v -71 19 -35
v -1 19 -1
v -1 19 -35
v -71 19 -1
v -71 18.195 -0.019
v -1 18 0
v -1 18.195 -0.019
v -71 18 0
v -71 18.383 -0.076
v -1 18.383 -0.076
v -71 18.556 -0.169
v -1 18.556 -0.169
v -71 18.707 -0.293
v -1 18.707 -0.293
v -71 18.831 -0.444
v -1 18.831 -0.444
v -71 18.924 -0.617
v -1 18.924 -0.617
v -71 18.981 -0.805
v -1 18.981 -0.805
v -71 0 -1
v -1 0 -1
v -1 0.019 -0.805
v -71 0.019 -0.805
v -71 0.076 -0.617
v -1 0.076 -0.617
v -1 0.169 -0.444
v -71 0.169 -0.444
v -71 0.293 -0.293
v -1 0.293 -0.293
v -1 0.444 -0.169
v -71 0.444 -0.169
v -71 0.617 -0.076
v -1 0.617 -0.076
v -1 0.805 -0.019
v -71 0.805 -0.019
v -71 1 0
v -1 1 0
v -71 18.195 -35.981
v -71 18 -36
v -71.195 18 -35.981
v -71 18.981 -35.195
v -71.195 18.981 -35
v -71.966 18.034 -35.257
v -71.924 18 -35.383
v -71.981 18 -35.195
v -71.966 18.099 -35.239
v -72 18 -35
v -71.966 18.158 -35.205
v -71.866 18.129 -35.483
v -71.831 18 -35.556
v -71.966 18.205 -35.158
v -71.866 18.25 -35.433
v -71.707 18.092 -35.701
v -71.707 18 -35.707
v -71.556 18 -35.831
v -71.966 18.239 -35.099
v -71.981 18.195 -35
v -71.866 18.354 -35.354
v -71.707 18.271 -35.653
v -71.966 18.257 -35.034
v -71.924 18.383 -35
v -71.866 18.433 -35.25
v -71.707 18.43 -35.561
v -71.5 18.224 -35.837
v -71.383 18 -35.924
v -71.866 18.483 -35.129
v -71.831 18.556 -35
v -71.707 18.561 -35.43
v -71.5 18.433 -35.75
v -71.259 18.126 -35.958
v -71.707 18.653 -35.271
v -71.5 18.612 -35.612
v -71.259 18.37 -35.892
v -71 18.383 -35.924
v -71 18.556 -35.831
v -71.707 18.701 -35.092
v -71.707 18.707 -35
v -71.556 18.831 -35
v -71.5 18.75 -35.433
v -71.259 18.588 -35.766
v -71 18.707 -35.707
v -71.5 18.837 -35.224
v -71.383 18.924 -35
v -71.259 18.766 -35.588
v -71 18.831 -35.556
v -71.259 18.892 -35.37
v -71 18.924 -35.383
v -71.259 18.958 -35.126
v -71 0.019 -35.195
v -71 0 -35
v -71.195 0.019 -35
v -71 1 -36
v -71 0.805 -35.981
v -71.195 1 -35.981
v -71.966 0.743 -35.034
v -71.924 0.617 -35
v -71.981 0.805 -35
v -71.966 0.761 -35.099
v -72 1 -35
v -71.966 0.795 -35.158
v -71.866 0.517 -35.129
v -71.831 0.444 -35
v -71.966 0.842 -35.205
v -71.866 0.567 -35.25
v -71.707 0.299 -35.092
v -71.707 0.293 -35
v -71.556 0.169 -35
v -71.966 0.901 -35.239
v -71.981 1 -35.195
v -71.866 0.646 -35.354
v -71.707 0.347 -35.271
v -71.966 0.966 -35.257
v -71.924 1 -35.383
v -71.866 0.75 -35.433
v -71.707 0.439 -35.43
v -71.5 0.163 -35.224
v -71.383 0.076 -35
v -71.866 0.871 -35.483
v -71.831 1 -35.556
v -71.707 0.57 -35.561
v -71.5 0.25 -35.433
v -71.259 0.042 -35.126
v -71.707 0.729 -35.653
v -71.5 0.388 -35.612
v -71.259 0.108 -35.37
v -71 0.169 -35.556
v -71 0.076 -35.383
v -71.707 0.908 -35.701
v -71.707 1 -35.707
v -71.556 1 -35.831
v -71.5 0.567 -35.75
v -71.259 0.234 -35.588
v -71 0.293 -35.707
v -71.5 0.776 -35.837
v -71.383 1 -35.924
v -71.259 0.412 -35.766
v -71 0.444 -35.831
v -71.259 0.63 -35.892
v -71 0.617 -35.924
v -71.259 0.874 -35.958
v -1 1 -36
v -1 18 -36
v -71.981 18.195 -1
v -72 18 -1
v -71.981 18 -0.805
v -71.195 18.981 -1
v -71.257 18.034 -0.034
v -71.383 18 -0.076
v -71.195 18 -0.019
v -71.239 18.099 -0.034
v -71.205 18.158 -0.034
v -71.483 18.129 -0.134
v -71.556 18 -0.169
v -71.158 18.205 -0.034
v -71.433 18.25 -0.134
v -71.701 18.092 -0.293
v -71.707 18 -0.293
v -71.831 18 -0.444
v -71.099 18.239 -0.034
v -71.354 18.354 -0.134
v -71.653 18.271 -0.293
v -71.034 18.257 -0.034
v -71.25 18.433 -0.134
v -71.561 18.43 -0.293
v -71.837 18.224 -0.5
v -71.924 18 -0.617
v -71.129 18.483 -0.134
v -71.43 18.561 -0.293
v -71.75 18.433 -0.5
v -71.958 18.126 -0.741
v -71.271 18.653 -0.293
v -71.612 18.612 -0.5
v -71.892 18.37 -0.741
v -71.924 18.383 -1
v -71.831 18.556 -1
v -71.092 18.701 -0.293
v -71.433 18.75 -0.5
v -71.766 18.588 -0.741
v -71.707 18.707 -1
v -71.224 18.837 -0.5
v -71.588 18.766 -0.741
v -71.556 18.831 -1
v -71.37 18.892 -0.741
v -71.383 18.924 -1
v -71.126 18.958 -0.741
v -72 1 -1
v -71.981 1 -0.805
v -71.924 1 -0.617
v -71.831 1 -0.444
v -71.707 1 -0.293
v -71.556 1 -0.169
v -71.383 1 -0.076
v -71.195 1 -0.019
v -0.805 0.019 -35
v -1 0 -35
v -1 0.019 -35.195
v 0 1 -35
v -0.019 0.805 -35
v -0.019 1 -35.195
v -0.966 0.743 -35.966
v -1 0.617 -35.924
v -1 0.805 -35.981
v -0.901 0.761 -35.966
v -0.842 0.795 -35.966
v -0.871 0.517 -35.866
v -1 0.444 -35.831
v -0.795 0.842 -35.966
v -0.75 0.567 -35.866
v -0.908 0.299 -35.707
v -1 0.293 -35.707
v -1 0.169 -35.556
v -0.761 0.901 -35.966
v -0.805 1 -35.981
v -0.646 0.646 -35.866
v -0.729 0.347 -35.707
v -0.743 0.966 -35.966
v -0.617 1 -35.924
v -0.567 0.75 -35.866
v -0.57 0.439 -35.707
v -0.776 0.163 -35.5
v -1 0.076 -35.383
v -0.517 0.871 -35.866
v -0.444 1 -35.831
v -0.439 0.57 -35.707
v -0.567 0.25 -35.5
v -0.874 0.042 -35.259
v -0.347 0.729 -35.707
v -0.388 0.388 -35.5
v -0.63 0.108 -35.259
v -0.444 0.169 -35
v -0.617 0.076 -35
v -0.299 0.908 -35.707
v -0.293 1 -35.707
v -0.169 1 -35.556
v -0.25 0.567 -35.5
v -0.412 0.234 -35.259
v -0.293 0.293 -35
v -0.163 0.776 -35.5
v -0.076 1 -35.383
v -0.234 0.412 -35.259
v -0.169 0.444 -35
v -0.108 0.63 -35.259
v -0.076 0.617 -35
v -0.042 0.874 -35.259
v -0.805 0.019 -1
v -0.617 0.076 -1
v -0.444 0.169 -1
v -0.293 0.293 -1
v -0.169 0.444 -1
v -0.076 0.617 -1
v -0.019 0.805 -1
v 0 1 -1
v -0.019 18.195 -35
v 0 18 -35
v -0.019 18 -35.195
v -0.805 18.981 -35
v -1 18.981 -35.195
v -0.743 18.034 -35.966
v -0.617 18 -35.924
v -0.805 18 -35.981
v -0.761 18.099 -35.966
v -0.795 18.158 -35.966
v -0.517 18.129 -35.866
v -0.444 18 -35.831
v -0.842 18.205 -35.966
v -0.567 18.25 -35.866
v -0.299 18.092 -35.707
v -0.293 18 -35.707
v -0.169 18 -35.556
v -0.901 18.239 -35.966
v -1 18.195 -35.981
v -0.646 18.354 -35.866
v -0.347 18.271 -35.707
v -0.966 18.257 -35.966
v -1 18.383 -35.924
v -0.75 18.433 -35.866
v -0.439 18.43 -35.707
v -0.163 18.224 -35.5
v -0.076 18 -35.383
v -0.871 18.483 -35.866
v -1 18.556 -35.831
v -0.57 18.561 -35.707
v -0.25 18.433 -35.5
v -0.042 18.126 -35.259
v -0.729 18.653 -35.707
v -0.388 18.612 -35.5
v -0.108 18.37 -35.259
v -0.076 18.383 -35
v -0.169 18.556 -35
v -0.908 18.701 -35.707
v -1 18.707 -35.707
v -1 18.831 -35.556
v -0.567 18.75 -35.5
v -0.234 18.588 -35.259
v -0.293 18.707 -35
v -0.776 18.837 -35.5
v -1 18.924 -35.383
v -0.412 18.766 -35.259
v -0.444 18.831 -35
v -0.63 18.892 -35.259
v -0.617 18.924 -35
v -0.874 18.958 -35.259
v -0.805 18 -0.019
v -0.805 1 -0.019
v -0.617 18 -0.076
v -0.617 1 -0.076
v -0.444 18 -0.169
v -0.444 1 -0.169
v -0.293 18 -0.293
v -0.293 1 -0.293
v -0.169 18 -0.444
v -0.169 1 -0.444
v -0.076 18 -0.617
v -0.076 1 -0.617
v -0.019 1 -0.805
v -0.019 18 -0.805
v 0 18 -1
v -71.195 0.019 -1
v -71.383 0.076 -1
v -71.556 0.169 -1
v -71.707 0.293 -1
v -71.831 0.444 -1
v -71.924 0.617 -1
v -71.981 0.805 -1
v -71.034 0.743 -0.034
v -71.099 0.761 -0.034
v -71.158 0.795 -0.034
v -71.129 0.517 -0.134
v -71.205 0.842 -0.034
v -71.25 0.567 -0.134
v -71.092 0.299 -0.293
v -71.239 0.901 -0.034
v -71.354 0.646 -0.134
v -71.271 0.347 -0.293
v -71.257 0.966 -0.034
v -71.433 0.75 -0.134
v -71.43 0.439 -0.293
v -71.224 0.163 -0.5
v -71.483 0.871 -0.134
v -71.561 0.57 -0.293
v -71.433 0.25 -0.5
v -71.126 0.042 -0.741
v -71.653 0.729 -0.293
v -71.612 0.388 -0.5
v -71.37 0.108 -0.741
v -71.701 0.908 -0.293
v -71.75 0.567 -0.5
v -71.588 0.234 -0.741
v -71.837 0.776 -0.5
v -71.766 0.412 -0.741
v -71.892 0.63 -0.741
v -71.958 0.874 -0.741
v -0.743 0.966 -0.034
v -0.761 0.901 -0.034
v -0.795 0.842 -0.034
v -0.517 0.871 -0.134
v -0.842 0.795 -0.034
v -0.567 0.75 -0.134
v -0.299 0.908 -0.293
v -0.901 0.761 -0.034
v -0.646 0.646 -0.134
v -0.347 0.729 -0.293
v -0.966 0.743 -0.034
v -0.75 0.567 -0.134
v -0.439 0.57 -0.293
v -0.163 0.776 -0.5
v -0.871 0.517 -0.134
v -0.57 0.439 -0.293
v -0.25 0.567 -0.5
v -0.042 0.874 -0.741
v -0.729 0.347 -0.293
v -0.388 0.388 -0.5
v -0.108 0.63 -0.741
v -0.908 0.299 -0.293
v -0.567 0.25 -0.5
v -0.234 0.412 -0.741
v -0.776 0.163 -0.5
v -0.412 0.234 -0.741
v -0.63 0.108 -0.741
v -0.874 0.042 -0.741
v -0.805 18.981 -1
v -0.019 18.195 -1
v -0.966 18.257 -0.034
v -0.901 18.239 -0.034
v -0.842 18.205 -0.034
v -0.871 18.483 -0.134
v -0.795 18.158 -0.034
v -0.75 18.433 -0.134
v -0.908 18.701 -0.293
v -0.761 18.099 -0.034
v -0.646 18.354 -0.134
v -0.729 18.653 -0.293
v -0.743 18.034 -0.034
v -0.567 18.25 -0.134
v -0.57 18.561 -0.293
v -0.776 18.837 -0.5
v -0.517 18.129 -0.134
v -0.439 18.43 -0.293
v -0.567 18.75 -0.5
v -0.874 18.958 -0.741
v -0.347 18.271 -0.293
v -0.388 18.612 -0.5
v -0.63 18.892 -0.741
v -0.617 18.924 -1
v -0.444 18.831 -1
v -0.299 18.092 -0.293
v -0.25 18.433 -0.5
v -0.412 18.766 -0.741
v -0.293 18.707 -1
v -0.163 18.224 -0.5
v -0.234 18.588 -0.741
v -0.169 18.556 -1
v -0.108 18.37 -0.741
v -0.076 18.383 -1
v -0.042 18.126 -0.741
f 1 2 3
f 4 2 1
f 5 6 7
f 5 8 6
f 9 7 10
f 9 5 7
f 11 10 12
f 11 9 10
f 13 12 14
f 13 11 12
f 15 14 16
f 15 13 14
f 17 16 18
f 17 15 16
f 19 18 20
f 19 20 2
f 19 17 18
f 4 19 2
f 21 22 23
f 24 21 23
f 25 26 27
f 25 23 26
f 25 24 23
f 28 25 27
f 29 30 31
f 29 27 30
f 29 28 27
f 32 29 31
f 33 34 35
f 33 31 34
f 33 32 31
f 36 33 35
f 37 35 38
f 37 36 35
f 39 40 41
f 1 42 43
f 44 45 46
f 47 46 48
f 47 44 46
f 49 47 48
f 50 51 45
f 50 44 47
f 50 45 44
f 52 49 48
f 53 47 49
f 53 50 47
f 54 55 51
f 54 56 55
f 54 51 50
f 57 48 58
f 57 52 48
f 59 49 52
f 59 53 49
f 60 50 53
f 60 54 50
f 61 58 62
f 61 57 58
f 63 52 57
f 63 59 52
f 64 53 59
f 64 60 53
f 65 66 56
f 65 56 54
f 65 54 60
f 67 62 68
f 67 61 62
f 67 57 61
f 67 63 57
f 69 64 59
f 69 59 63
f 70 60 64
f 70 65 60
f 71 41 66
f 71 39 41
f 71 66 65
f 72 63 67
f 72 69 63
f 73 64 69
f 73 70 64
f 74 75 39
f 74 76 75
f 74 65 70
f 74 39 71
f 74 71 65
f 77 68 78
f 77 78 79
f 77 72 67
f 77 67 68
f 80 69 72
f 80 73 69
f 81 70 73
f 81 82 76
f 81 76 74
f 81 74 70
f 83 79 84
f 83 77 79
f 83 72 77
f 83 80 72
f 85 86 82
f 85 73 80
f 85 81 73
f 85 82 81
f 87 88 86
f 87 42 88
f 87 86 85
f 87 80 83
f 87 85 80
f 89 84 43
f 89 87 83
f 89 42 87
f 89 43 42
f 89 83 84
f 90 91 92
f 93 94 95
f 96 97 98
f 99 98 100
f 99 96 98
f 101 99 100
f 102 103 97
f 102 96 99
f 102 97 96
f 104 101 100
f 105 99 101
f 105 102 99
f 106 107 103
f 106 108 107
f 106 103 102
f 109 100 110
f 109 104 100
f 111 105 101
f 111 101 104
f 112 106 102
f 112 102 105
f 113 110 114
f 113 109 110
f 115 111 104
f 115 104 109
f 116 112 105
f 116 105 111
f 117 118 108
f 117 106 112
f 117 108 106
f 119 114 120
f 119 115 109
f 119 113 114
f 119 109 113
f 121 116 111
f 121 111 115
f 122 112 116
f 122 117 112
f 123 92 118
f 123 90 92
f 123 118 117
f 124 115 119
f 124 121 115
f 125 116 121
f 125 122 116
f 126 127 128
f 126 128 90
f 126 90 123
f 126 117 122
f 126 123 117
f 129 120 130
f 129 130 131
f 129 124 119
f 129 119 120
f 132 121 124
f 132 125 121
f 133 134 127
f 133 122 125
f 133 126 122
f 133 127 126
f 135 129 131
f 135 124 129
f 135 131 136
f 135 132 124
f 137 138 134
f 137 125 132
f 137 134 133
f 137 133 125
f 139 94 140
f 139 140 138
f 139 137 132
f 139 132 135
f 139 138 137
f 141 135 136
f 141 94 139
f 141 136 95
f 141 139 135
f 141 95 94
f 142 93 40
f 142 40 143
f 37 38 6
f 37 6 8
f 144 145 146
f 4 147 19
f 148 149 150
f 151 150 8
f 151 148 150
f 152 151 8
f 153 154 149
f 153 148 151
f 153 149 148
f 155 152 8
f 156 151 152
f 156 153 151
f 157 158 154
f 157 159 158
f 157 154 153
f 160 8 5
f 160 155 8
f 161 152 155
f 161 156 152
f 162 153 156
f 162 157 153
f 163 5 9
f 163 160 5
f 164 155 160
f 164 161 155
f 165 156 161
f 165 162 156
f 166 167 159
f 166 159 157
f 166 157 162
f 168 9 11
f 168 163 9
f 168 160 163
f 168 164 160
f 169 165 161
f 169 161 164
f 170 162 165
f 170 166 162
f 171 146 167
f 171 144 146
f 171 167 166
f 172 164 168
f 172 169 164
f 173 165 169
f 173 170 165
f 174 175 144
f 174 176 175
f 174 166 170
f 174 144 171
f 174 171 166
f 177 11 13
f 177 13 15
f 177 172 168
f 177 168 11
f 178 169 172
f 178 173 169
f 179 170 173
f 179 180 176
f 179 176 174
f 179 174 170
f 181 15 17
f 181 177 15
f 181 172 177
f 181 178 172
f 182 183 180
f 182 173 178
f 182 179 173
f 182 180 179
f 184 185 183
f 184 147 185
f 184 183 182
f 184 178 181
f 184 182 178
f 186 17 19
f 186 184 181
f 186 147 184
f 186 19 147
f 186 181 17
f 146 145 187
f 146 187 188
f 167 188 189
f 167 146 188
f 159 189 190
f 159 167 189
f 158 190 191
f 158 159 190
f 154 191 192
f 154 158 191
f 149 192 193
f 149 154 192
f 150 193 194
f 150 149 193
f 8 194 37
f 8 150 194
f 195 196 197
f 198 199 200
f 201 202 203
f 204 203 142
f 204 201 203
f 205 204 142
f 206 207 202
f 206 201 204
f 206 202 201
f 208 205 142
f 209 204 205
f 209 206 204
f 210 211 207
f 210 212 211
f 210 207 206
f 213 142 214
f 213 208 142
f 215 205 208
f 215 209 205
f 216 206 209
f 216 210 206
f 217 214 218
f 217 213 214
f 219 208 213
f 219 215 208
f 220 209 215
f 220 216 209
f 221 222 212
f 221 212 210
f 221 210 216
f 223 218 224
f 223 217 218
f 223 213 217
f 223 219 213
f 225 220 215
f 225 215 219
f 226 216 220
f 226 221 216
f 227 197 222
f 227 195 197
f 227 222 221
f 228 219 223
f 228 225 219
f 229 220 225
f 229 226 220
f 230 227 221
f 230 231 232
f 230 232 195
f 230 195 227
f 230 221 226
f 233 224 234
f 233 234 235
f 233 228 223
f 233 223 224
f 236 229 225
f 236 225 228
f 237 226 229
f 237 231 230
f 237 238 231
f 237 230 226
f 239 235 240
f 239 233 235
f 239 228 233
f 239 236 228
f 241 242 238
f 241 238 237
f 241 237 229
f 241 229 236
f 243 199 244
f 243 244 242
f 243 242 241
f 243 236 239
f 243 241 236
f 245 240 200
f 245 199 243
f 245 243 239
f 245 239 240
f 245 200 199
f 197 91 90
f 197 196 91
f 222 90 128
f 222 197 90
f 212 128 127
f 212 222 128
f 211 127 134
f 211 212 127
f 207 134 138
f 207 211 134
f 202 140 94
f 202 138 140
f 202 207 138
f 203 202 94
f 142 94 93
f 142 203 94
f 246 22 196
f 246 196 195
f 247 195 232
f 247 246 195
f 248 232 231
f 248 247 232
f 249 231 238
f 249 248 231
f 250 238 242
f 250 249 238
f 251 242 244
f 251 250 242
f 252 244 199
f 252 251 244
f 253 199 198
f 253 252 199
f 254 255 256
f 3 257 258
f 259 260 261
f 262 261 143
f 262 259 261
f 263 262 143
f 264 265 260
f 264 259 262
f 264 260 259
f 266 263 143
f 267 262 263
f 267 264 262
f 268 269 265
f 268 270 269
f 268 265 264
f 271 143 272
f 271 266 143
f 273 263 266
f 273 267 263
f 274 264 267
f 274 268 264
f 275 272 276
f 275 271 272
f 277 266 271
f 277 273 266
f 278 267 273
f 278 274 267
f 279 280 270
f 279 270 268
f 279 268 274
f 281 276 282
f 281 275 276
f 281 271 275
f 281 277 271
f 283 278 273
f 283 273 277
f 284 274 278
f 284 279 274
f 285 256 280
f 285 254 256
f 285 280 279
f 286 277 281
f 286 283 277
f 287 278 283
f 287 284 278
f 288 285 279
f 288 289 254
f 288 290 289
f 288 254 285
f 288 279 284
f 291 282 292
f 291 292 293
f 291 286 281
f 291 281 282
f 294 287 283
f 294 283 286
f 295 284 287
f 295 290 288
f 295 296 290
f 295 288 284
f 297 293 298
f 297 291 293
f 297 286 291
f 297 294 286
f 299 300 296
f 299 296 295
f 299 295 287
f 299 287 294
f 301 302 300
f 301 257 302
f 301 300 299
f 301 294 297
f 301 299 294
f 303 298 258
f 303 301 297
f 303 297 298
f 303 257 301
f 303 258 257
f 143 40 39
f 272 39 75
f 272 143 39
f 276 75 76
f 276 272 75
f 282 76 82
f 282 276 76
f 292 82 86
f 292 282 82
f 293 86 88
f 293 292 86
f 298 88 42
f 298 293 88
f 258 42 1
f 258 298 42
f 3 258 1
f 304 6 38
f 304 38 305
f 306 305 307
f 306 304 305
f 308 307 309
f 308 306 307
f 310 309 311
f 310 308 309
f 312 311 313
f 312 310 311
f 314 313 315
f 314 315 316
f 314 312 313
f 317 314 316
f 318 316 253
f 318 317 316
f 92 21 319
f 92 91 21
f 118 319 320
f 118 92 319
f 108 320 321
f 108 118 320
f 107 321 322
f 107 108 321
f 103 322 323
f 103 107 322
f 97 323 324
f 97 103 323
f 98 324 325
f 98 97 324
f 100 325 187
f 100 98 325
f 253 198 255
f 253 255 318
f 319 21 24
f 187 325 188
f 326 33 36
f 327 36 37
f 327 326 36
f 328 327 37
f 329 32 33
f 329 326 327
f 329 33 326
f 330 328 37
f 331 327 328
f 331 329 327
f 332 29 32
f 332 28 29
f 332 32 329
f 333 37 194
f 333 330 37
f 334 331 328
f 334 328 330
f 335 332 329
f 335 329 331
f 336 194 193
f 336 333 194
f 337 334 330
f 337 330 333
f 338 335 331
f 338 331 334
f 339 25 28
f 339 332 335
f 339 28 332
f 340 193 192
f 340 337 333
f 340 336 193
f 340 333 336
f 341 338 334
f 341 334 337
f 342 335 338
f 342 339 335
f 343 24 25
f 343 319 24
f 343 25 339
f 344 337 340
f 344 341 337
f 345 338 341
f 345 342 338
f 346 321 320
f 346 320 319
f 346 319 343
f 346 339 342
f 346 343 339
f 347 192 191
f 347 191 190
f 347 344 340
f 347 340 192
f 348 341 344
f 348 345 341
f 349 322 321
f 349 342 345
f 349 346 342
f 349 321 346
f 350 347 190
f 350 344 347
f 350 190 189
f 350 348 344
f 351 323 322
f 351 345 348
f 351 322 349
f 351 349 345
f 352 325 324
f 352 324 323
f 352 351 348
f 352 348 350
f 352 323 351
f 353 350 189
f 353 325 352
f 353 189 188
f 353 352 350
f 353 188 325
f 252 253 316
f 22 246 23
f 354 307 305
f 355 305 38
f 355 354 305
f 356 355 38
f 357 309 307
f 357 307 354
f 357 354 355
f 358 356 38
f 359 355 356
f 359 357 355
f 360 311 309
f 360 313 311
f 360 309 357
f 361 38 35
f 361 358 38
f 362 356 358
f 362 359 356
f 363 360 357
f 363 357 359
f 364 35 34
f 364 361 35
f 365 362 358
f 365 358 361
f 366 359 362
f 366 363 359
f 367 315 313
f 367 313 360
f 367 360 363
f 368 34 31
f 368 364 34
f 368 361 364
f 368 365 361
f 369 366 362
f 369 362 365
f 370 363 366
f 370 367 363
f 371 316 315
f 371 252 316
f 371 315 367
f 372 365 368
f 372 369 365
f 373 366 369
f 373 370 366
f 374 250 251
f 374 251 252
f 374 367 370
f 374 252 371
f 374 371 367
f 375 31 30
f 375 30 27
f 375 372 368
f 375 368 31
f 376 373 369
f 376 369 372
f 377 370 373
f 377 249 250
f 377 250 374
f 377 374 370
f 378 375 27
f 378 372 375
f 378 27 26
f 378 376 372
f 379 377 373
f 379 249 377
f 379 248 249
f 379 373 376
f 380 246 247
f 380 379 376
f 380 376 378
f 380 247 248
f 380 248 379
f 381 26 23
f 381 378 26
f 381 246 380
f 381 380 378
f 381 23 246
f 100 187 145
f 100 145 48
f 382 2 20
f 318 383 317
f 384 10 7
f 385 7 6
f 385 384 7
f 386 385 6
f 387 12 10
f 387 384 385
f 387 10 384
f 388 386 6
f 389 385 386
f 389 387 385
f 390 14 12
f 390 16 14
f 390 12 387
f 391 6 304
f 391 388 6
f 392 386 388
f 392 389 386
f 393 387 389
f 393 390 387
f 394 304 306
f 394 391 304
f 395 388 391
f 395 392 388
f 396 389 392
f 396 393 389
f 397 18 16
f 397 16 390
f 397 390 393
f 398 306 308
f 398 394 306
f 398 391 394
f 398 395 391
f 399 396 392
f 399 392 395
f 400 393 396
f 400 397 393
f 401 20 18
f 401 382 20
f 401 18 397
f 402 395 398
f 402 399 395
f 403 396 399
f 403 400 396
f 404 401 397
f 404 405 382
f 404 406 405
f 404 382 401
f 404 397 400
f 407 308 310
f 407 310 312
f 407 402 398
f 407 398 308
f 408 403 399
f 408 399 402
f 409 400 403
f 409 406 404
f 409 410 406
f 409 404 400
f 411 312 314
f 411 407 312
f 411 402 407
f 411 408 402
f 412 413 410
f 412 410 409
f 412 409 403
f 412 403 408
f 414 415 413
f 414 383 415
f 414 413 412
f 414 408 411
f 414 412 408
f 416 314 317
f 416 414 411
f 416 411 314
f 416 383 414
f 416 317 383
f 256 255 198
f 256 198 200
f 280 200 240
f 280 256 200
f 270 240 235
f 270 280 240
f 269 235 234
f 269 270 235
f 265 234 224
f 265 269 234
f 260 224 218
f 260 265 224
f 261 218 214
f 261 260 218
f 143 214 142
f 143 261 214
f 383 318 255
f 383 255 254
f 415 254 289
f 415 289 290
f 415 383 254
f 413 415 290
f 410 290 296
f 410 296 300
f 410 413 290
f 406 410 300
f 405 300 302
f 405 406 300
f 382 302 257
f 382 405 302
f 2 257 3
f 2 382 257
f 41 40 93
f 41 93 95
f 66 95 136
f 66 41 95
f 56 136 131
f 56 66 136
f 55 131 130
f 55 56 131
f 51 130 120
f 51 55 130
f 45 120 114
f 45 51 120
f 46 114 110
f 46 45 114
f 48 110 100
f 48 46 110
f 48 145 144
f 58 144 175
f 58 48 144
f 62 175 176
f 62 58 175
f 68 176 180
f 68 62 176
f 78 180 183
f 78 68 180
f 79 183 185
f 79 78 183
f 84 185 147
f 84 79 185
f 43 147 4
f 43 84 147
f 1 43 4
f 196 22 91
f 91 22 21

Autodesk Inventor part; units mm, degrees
ref_plane "YZ Plane" through (0, 0, 0) normal (1, 0, 0) x (0, 1, 0)
ref_plane "XZ Plane" through (0, 0, 0) normal (0, 1, 0) x (-1, 0, 0)
ref_plane "XY Plane" through (0, 0, 0) normal (0, 0, 1) x (1, 0, 0)
sketch "Sketch1" plane through (0, 0, 0) normal (0, 1, 0) x (-1, 0, 0)
  line L0 (0, 0) -> (72, 0)
  line L1 (72, 0) -> (72, -36)
  line L2 (72, -36) -> (0, -36)
  line L3 (0, -36) -> (0, 0)
  dimension "d0" = 72
  dimension "d1" = 36
extrude "Extrusion1" add sketch "Sketch1" along normal blind 19
fillet "Fillet1" radius 1 12 edges at (0, 19, -18) (0, 0, -18) (0, 9.5, -36) (-36, 0, -36) (-36, 19, -36) (-72, 9.5, -36) (-72, 19, -18) (-72, 0, -18) (-72, 9.5, 0) (-36, 19, 0) (-36, 0, 0) (0, 9.5, 0)
properties part number "Battery[72x36x19]"
